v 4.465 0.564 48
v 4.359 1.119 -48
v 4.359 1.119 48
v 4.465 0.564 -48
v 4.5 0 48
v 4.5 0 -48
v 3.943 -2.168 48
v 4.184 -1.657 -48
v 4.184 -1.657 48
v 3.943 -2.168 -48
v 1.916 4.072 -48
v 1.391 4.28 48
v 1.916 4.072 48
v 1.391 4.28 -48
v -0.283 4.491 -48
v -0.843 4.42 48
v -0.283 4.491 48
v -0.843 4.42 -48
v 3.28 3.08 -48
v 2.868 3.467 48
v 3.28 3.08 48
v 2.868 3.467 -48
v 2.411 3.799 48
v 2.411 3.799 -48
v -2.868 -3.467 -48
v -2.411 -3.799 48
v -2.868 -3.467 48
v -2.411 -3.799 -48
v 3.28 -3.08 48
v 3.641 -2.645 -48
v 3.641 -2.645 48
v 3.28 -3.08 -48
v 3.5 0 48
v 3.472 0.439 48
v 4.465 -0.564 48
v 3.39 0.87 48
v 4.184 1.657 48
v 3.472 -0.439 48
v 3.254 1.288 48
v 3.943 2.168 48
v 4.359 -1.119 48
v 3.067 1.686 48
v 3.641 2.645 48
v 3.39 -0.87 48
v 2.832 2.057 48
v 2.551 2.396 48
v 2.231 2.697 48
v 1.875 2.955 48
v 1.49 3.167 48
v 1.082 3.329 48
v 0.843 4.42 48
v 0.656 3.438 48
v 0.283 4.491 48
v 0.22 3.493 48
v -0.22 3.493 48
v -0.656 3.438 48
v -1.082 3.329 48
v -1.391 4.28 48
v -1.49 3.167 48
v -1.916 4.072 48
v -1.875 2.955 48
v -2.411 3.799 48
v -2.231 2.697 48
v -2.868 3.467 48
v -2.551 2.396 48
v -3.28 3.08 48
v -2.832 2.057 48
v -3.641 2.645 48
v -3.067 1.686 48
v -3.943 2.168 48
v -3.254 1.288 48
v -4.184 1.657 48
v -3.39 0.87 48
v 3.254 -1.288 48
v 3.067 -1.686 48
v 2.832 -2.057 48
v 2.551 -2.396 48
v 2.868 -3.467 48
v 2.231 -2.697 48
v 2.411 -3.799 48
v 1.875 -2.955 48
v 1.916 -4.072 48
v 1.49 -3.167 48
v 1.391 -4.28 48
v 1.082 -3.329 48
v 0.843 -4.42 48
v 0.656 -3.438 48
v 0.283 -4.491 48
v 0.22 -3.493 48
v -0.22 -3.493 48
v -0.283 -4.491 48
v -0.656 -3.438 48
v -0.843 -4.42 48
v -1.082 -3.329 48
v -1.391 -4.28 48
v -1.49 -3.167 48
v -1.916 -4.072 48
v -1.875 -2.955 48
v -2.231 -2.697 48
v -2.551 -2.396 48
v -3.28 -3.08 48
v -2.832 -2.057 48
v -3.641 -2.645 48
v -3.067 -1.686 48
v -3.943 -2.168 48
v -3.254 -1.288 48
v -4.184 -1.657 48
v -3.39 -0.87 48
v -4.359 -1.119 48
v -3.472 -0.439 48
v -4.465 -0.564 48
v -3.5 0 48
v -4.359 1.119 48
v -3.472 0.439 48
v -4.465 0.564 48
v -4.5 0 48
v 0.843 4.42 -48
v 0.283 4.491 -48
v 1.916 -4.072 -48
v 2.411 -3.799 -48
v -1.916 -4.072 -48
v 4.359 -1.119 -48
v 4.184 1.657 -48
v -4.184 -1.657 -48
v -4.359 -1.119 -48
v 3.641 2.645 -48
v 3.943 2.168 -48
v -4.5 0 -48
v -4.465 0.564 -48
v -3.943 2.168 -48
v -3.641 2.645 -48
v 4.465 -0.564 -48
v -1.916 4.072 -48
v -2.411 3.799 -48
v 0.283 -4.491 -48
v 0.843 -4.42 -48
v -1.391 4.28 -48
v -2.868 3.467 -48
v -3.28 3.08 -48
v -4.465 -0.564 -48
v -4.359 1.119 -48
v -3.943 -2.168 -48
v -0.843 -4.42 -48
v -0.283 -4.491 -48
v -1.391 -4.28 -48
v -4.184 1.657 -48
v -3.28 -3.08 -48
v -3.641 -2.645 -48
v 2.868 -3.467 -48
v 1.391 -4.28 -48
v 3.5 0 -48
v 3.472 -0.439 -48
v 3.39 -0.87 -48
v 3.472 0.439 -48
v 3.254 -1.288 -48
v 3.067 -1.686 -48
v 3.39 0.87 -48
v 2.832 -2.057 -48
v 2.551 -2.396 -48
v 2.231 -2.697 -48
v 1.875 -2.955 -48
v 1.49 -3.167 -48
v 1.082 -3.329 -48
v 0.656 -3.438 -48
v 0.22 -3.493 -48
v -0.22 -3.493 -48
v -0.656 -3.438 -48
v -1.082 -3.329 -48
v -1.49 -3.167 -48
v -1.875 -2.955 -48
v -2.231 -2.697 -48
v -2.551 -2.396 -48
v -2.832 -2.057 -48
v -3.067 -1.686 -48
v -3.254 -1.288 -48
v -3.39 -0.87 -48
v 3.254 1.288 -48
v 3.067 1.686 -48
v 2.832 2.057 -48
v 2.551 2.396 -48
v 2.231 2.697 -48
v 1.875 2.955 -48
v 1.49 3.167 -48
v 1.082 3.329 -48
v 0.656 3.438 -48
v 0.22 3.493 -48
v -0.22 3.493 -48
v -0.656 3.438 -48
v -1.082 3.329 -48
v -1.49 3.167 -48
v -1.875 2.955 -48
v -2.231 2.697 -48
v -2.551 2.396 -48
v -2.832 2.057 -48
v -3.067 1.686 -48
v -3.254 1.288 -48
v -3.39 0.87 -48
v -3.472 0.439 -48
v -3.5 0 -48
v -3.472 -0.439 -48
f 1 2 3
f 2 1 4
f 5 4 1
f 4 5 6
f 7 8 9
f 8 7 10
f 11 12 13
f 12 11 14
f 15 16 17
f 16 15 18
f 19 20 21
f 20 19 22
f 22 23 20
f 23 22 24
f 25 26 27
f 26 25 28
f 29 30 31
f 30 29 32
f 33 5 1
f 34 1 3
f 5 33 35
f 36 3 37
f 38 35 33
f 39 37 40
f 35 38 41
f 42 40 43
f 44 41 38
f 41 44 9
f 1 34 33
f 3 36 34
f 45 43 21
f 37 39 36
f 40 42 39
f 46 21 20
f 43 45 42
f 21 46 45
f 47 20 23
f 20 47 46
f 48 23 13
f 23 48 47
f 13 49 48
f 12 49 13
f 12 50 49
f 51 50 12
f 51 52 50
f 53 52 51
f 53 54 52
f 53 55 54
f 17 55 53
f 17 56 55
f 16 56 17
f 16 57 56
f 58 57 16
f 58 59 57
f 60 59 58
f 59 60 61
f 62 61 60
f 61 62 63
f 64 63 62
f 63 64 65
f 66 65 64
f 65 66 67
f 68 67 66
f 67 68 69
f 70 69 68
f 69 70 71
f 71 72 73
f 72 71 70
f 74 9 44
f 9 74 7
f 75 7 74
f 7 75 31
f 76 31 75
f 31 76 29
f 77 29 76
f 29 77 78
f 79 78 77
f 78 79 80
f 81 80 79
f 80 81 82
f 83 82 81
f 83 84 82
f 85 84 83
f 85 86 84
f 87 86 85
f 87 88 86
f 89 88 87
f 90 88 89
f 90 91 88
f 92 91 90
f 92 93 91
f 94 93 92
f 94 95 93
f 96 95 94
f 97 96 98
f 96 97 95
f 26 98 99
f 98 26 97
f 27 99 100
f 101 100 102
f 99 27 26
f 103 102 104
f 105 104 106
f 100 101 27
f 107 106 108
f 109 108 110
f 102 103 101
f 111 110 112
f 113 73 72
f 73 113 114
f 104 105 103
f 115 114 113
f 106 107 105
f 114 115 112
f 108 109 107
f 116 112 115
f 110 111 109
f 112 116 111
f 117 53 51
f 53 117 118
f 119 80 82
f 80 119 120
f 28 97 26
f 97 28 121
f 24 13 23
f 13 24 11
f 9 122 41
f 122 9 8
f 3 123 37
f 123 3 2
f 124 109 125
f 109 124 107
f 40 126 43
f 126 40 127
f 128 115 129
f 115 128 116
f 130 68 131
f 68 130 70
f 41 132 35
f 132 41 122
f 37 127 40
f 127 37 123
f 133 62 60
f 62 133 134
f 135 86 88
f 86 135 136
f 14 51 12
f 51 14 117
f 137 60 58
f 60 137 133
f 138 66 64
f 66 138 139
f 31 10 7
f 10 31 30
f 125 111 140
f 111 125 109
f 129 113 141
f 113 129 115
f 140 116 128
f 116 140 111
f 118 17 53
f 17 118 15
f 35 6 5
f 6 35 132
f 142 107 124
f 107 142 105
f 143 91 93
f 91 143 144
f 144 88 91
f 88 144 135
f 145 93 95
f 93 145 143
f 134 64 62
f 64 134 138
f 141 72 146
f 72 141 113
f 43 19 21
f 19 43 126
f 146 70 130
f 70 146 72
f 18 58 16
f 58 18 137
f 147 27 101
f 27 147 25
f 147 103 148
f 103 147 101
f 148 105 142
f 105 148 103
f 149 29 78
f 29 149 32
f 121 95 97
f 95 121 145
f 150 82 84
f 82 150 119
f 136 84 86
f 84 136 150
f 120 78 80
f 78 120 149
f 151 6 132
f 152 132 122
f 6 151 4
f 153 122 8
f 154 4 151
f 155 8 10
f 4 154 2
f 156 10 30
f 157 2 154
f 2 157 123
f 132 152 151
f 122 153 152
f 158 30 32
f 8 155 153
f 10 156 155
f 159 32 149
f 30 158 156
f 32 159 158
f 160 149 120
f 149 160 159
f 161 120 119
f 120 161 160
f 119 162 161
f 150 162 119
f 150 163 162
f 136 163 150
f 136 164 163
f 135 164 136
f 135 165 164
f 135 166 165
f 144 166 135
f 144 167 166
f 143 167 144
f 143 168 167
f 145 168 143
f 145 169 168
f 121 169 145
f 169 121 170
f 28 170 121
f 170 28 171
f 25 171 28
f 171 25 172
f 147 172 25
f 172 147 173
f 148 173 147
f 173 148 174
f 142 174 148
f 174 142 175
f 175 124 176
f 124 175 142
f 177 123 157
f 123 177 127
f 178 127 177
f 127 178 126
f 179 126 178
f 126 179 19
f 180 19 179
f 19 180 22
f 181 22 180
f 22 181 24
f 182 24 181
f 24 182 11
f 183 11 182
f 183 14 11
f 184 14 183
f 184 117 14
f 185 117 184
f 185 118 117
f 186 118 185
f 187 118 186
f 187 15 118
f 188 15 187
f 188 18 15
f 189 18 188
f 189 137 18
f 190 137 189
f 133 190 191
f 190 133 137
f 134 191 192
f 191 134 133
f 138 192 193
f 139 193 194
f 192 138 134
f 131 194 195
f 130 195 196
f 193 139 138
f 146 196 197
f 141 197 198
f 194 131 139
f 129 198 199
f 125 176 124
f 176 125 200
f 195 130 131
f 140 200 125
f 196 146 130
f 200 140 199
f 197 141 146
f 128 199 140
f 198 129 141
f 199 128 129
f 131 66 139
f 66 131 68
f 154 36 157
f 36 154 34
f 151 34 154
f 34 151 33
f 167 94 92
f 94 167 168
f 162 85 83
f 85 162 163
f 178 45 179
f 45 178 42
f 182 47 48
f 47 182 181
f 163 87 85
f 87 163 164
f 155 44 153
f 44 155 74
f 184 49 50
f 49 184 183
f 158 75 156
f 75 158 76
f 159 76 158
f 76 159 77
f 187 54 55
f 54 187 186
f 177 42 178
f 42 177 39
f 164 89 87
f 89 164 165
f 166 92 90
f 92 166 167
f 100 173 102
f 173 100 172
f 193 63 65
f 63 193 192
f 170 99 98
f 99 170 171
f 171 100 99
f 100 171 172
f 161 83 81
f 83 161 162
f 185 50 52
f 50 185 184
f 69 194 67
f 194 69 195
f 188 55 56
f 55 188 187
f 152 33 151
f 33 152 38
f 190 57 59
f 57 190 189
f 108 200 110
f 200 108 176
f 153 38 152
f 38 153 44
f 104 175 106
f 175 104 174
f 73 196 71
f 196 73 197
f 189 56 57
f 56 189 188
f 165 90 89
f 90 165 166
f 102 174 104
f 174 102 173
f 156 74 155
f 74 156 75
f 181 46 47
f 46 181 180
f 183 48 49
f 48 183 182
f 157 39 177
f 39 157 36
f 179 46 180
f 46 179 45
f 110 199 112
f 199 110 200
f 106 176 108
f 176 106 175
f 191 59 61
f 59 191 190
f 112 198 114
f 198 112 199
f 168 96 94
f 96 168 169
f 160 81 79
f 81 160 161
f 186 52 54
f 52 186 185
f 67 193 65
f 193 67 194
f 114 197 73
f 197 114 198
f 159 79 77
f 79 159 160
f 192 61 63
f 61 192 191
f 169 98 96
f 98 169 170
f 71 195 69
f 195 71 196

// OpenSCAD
$fn = 50;


difference() {
	union() {
		translate(v = [0, 0, -48.0000000000]) {
			cylinder(h = 96, r = 4.5000000000);
		}
	}
	union() {
		translate(v = [0, 0, -100.0000000000]) {
			cylinder(h = 200, r = 3.5000000000);
		}
	}
}
